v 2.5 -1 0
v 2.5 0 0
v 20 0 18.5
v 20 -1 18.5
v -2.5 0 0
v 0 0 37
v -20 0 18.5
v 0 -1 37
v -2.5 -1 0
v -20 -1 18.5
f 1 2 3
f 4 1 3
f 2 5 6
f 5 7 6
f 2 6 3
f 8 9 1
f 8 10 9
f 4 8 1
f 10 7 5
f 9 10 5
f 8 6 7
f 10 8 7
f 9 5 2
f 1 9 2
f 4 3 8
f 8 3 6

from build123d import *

# Parameters (mm, degrees)
F1_DEPTH = 1


with BuildPart() as f1:
    # F0 (on Front) → F1 (new body)
    with BuildSketch(Plane.XZ):
        Polygon((-2.5, 0), (0, 0), (0, 18.5), (-20, 18.5), align=None)
        Polygon((0, 18.5), (0, 0), (2.5, 0), (20, 18.5), align=None)
        Polygon((-20, 18.5), (0, 18.5), (0, 37), align=None)
        Polygon((0, 37), (0, 18.5), (20, 18.5), align=None)
    extrude(amount=F1_DEPTH)


solid = f1.part
